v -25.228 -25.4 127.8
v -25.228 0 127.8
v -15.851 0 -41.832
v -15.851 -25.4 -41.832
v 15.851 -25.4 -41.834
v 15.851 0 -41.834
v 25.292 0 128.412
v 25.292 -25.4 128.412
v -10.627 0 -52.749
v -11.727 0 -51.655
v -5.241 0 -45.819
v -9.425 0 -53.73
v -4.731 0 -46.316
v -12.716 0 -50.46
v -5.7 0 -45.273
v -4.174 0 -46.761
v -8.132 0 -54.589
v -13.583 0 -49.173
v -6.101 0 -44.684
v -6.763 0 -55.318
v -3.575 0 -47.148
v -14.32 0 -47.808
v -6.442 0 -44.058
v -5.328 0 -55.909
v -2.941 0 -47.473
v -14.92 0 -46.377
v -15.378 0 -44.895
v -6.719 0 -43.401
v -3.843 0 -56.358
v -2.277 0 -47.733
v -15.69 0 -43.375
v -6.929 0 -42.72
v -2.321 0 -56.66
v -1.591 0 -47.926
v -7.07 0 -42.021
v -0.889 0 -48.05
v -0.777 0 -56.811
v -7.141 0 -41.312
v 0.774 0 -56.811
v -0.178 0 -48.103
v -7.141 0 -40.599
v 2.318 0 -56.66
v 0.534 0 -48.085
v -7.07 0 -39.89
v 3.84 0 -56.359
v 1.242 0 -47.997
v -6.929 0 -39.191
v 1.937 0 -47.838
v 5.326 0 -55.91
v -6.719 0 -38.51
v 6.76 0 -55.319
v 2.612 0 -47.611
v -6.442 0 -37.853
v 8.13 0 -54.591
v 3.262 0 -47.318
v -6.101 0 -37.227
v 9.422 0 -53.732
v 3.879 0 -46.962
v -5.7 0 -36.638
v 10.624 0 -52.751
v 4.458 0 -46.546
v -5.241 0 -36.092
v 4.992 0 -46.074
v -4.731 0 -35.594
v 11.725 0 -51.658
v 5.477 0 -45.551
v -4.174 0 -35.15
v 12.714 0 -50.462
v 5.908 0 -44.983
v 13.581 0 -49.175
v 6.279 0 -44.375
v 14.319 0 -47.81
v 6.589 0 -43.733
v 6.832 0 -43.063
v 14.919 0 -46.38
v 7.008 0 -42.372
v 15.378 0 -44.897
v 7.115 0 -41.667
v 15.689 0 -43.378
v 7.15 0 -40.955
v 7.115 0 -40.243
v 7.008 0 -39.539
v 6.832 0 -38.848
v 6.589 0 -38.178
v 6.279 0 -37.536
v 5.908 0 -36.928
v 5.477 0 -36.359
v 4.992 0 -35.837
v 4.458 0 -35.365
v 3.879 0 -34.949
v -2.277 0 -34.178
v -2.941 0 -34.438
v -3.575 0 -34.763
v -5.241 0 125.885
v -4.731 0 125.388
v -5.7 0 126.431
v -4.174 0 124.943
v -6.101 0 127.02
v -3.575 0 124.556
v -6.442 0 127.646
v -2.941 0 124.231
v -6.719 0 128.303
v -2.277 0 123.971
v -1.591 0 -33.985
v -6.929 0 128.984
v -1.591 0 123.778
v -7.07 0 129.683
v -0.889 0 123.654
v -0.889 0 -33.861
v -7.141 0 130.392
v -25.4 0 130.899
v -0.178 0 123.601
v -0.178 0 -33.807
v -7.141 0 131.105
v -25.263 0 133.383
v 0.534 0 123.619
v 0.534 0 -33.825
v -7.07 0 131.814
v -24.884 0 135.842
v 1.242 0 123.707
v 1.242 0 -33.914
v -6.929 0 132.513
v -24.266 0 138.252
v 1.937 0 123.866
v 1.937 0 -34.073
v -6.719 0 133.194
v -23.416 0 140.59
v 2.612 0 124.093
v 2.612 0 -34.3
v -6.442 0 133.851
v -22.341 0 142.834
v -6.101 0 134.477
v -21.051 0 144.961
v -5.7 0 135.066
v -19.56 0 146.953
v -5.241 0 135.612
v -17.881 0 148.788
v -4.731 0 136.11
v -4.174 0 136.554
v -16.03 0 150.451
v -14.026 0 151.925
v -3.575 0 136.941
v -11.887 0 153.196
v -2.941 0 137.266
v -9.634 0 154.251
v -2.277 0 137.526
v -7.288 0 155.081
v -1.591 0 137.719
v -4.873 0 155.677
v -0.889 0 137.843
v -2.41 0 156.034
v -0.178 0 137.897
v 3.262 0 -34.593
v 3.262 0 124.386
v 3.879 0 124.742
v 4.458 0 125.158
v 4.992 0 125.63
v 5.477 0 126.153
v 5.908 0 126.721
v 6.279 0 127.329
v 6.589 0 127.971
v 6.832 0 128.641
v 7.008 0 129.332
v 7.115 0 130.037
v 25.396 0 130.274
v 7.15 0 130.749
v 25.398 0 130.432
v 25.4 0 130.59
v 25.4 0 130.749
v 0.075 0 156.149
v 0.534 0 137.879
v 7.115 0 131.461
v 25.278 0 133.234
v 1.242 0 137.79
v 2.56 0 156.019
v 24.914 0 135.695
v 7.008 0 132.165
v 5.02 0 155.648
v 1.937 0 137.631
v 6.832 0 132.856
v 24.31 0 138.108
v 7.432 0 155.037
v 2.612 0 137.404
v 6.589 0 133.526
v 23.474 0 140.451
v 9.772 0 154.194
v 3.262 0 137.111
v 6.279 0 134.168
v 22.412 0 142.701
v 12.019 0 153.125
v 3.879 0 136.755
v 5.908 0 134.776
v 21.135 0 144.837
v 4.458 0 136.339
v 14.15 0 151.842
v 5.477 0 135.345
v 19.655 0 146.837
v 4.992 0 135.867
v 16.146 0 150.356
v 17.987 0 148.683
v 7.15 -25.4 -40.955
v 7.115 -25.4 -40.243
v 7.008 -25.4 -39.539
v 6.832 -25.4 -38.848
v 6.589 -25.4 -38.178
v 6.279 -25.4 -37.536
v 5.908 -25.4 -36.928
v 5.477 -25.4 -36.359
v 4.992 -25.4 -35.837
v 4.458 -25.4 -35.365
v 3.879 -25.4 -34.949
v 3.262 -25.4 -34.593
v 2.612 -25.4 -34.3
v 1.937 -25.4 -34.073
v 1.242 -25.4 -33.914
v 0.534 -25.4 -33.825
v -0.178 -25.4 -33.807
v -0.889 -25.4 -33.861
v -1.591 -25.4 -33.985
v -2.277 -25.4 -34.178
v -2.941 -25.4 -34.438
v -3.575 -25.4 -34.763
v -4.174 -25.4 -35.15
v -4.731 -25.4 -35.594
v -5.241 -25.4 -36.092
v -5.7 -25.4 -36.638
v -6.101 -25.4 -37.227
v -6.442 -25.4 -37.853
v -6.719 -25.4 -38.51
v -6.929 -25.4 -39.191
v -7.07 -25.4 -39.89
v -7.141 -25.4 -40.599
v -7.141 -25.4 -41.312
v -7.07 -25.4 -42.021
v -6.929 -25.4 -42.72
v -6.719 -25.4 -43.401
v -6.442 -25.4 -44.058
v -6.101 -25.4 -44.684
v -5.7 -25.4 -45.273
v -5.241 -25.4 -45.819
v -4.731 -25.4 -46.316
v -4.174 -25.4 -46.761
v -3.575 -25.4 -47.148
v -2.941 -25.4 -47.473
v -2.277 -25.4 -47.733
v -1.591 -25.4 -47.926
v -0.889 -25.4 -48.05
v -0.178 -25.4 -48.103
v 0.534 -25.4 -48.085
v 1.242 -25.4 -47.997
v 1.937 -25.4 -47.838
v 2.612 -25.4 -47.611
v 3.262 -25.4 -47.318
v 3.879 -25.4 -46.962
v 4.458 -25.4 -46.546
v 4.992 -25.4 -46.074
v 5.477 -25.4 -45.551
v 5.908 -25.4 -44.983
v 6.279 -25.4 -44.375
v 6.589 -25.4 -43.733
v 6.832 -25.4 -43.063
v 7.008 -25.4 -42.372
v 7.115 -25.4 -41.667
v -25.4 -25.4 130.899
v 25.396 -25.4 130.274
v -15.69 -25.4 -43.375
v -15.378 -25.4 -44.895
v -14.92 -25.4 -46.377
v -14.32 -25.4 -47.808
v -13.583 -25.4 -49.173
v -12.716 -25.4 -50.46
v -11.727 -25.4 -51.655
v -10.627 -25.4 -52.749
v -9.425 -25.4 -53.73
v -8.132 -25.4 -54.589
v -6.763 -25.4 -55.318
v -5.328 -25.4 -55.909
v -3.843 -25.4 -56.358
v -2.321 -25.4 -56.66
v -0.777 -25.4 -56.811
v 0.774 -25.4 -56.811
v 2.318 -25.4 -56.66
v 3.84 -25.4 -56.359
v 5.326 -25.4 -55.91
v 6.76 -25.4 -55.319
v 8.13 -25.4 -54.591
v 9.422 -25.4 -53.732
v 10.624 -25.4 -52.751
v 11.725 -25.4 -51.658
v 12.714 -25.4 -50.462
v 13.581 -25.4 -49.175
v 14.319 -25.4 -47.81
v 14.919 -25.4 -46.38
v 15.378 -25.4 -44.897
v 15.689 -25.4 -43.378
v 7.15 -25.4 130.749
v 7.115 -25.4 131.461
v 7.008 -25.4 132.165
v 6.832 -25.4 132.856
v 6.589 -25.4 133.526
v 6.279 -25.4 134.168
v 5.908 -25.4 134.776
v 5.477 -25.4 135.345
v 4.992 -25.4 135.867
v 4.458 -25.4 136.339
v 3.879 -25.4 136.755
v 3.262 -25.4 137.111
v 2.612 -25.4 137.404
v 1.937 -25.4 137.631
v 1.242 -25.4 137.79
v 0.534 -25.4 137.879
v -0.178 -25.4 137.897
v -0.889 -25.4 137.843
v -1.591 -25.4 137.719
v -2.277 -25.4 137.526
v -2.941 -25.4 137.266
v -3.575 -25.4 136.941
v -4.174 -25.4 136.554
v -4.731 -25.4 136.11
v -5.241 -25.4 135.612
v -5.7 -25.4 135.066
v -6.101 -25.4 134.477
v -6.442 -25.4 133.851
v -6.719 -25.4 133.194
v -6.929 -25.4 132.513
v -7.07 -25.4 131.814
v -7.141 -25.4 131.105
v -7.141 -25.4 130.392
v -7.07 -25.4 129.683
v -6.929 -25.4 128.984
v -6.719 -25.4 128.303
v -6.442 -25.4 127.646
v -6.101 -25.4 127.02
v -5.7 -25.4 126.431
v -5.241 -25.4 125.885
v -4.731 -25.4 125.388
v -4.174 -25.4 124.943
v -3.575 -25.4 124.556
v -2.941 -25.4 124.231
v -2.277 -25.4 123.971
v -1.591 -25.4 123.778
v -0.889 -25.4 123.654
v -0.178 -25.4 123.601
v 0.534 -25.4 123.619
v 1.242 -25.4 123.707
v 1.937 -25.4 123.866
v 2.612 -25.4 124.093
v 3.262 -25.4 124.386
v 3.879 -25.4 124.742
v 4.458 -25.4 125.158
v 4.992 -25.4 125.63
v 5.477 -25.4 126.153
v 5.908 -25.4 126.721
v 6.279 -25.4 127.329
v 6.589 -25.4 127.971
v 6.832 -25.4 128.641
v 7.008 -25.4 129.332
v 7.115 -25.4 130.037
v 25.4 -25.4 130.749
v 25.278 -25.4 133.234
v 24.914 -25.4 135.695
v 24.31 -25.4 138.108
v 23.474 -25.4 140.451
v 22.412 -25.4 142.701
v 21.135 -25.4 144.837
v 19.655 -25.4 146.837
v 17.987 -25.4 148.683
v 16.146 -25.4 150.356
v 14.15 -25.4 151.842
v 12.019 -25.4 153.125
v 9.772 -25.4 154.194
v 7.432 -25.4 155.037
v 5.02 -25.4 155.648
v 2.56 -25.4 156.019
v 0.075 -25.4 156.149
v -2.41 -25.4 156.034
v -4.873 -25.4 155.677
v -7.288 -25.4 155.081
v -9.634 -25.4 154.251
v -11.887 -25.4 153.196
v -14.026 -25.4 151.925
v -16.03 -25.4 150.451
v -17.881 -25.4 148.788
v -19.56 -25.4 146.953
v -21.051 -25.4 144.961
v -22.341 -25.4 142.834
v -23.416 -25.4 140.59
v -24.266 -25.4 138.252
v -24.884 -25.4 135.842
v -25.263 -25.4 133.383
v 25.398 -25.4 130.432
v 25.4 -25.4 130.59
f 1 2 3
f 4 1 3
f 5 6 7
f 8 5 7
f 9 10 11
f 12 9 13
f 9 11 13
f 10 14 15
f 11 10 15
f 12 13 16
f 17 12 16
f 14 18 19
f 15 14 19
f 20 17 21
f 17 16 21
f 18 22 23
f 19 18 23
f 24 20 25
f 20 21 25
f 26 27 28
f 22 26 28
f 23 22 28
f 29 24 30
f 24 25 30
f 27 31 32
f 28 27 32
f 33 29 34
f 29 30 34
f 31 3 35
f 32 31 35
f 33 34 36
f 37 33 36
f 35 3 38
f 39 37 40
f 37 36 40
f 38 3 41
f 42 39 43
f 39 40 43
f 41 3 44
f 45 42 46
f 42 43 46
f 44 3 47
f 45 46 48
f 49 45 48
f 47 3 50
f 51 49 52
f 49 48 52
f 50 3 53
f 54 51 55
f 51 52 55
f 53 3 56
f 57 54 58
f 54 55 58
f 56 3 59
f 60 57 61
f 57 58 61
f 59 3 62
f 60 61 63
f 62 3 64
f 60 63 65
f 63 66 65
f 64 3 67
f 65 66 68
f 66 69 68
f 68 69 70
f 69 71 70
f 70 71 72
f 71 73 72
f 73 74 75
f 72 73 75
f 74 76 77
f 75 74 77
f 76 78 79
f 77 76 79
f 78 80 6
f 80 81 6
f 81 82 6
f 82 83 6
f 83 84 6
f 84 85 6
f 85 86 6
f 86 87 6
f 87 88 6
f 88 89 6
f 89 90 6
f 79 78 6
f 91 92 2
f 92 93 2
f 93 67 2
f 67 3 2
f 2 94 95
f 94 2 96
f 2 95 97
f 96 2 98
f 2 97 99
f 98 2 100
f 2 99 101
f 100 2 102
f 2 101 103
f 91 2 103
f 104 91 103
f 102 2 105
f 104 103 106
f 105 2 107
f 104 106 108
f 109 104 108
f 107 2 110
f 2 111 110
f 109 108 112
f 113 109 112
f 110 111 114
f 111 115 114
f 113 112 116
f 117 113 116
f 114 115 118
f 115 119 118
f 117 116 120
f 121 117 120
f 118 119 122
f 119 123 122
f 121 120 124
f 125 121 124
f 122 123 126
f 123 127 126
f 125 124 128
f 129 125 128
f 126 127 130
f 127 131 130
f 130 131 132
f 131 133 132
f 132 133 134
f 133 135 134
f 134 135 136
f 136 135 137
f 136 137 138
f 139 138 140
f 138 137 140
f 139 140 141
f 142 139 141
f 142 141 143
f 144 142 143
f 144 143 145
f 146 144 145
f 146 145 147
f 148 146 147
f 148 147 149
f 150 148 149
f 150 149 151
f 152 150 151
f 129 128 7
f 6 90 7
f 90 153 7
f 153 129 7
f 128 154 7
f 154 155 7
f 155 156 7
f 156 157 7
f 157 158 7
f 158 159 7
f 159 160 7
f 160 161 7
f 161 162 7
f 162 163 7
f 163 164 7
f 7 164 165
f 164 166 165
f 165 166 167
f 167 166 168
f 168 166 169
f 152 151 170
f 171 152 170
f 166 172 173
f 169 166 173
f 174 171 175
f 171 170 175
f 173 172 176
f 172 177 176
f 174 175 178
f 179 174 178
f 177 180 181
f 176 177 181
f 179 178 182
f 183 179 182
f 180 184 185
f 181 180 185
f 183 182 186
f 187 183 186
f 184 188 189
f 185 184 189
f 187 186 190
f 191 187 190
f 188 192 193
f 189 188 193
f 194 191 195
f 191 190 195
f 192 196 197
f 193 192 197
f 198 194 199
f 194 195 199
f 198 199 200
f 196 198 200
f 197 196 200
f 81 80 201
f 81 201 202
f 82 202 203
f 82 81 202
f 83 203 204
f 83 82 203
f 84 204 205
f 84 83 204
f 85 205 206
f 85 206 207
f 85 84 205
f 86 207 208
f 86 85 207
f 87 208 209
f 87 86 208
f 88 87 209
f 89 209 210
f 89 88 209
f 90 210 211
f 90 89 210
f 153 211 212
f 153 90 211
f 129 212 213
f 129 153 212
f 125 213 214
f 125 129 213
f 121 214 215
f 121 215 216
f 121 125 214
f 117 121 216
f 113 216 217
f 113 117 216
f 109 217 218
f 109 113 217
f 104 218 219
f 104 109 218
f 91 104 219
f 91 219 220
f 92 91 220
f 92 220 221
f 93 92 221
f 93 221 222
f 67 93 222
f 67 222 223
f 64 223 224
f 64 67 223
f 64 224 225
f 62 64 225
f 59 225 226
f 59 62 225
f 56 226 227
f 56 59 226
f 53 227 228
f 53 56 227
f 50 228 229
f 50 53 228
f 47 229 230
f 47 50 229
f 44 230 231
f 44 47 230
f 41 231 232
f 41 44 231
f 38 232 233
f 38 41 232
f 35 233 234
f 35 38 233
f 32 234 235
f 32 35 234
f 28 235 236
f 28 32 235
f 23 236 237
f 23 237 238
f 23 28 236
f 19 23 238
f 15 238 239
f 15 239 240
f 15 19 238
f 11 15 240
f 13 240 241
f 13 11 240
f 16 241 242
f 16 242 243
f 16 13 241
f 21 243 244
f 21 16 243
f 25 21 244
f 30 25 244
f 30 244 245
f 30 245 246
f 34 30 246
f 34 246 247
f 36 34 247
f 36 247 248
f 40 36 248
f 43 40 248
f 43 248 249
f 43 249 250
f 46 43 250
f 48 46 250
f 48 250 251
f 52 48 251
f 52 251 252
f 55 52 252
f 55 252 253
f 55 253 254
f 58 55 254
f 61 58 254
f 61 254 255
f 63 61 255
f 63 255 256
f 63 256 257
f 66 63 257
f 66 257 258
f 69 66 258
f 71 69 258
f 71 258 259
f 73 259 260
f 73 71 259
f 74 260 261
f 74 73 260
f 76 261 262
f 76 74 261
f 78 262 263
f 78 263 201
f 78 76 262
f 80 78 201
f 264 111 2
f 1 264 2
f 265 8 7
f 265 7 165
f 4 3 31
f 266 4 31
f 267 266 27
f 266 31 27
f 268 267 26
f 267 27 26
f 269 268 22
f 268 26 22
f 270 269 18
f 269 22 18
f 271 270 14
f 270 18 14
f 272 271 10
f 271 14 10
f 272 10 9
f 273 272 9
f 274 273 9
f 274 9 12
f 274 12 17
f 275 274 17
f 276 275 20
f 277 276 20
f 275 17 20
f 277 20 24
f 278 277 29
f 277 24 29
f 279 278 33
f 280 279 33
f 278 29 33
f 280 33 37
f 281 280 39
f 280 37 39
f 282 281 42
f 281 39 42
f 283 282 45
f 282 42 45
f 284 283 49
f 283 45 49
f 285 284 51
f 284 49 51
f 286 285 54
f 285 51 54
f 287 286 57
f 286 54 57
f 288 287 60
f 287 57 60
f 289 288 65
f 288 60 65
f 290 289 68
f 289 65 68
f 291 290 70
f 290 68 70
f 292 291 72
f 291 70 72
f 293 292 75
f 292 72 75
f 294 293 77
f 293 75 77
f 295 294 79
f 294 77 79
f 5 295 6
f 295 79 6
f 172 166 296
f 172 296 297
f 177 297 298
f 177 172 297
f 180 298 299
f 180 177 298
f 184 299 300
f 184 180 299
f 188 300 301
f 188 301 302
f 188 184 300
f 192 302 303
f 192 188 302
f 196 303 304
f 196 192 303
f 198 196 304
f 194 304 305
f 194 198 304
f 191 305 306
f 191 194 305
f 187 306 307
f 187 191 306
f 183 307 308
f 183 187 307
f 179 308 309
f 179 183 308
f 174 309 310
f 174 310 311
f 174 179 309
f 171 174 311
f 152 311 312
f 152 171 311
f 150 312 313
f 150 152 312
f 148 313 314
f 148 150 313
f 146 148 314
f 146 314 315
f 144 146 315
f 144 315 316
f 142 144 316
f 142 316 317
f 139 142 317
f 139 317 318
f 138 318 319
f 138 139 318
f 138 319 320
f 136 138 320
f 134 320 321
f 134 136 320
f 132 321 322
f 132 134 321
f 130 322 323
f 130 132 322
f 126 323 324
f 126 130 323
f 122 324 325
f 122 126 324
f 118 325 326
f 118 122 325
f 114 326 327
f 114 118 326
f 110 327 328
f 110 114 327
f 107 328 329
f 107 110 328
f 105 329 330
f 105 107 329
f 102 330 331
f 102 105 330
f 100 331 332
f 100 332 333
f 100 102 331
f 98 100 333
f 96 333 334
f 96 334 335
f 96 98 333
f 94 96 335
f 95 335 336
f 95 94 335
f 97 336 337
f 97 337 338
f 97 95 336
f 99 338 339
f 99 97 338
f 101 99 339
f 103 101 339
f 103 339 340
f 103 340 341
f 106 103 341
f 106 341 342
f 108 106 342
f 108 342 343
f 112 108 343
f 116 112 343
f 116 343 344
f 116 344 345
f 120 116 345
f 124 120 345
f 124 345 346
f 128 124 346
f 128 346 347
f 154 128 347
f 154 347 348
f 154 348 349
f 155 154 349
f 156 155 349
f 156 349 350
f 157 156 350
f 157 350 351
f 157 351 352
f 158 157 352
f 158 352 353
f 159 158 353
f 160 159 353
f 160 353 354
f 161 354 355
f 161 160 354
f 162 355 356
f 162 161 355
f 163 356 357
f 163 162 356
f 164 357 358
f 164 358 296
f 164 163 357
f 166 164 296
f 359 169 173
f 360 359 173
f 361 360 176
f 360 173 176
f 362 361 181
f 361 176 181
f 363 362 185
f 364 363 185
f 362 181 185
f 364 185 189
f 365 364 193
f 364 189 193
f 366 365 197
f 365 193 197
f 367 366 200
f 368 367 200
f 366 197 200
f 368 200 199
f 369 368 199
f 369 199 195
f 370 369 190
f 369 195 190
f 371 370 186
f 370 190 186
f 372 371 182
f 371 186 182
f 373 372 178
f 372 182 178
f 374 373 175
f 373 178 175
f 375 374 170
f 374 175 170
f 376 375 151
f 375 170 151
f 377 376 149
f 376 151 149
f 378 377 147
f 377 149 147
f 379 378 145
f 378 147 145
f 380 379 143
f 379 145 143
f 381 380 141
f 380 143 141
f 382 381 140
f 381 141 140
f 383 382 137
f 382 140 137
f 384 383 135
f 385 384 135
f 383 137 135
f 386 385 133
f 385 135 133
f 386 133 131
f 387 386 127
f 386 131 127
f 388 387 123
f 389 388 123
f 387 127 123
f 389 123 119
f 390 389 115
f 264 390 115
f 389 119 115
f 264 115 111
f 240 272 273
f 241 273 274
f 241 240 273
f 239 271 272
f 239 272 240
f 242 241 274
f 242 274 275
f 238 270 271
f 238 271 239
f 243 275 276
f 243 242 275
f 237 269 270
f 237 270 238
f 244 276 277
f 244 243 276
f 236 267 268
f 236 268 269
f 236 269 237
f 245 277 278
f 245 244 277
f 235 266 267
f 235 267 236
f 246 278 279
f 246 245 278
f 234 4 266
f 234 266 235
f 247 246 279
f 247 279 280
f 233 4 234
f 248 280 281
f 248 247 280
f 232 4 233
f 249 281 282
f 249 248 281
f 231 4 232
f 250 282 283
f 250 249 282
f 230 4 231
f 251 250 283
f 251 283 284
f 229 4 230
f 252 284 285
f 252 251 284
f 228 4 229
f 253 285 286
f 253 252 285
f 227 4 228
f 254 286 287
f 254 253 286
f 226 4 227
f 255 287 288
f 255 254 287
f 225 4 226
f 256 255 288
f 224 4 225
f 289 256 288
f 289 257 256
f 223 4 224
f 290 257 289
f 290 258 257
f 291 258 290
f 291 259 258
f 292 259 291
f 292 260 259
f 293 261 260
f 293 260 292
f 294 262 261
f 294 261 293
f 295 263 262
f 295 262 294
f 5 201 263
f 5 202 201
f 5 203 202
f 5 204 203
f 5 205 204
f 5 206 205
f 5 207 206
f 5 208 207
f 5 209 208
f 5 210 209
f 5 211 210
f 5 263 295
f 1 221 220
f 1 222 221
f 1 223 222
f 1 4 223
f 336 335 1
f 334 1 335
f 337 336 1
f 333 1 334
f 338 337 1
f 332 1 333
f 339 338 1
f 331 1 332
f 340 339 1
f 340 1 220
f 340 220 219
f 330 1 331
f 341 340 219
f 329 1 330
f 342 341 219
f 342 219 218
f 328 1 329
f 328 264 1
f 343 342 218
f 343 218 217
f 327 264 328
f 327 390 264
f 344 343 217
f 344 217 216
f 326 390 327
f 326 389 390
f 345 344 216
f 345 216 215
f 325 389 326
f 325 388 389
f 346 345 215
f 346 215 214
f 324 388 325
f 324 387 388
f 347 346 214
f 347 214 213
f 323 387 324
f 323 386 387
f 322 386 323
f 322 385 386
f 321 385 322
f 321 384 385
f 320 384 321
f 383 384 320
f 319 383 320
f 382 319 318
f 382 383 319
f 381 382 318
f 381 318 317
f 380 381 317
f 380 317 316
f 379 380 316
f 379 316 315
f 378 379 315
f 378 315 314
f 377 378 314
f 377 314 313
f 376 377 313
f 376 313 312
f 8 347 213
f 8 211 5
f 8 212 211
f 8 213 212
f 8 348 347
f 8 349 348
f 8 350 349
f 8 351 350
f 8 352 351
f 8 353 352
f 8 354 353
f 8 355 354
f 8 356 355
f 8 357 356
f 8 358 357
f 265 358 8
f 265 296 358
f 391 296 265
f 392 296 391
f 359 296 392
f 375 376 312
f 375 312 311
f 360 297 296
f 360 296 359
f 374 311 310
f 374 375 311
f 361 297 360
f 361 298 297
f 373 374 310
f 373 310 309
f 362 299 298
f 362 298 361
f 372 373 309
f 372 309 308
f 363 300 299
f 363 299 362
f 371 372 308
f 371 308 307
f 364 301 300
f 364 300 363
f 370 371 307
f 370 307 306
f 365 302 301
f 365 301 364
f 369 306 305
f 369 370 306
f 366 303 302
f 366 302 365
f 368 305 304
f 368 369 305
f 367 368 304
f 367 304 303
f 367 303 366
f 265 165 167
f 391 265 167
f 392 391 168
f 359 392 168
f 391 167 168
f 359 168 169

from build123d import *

# Parameters (mm, degrees)
F0_R     = 7.1501
F1_DEPTH = 25.4


with BuildPart() as f1:
    # F0 (on Front) → F1 (new body)
    with BuildSketch(Plane.XZ):
        with BuildLine():
            ThreePointArc((25.2923109526, 128.4121790948), (0.3078063491, 105.3504959458), (-25.2282585963, 127.7999076763))
            Line((-25.2282585963, 127.7999076763), (-15.8507982355, -41.8316227352))
            ThreePointArc((-15.8507982355, -41.8316227352), (-0.4382938581, -25.0864207714), (15.875, -40.9553691768))
            ThreePointArc((15.875, -40.9553691768), (15.8689095808, -41.3950664769), (15.8506429964, -41.8344263987))
            Line((15.8506429964, -41.8344263987), (25.2923109526, 128.4121790948))
        make_face()
        with BuildLine():
            ThreePointArc((25.3955649857, 130.273995114), (25.3988912222, 130.5113026086), (25.4, 130.7486308232))
            ThreePointArc((25.4, 130.7486308232), (0.0749748393, 156.1485201689), (-25.3995573837, 130.8985798486))
            Line((-25.3995573837, 130.8985798486), (-25.2282585963, 127.7999076763))
            ThreePointArc((-25.2282585963, 127.7999076763), (0.3078063491, 105.3504959458), (25.2923109526, 128.4121790948))
            Line((25.2923109526, 128.4121790948), (25.3955649857, 130.273995114))
        make_face()
        with Locations((0, 130.7486308232)):
            Circle(F0_R, mode=Mode.SUBTRACT)
        with BuildLine():
            ThreePointArc((15.875, -40.9553691768), (-0.4382938581, -25.0864207714), (-15.8507982355, -41.8316227352))
            ThreePointArc((-15.8507982355, -41.8316227352), (-0.001403979, -56.8303691147), (15.8506429964, -41.8344263987))
            ThreePointArc((15.8506429964, -41.8344263987), (15.8689095808, -41.3950664769), (15.875, -40.9553691768))
        make_face()
        with Locations((0, -40.9553691768)):
            Circle(F0_R, mode=Mode.SUBTRACT)
    extrude(amount=F1_DEPTH)


solid = f1.part
